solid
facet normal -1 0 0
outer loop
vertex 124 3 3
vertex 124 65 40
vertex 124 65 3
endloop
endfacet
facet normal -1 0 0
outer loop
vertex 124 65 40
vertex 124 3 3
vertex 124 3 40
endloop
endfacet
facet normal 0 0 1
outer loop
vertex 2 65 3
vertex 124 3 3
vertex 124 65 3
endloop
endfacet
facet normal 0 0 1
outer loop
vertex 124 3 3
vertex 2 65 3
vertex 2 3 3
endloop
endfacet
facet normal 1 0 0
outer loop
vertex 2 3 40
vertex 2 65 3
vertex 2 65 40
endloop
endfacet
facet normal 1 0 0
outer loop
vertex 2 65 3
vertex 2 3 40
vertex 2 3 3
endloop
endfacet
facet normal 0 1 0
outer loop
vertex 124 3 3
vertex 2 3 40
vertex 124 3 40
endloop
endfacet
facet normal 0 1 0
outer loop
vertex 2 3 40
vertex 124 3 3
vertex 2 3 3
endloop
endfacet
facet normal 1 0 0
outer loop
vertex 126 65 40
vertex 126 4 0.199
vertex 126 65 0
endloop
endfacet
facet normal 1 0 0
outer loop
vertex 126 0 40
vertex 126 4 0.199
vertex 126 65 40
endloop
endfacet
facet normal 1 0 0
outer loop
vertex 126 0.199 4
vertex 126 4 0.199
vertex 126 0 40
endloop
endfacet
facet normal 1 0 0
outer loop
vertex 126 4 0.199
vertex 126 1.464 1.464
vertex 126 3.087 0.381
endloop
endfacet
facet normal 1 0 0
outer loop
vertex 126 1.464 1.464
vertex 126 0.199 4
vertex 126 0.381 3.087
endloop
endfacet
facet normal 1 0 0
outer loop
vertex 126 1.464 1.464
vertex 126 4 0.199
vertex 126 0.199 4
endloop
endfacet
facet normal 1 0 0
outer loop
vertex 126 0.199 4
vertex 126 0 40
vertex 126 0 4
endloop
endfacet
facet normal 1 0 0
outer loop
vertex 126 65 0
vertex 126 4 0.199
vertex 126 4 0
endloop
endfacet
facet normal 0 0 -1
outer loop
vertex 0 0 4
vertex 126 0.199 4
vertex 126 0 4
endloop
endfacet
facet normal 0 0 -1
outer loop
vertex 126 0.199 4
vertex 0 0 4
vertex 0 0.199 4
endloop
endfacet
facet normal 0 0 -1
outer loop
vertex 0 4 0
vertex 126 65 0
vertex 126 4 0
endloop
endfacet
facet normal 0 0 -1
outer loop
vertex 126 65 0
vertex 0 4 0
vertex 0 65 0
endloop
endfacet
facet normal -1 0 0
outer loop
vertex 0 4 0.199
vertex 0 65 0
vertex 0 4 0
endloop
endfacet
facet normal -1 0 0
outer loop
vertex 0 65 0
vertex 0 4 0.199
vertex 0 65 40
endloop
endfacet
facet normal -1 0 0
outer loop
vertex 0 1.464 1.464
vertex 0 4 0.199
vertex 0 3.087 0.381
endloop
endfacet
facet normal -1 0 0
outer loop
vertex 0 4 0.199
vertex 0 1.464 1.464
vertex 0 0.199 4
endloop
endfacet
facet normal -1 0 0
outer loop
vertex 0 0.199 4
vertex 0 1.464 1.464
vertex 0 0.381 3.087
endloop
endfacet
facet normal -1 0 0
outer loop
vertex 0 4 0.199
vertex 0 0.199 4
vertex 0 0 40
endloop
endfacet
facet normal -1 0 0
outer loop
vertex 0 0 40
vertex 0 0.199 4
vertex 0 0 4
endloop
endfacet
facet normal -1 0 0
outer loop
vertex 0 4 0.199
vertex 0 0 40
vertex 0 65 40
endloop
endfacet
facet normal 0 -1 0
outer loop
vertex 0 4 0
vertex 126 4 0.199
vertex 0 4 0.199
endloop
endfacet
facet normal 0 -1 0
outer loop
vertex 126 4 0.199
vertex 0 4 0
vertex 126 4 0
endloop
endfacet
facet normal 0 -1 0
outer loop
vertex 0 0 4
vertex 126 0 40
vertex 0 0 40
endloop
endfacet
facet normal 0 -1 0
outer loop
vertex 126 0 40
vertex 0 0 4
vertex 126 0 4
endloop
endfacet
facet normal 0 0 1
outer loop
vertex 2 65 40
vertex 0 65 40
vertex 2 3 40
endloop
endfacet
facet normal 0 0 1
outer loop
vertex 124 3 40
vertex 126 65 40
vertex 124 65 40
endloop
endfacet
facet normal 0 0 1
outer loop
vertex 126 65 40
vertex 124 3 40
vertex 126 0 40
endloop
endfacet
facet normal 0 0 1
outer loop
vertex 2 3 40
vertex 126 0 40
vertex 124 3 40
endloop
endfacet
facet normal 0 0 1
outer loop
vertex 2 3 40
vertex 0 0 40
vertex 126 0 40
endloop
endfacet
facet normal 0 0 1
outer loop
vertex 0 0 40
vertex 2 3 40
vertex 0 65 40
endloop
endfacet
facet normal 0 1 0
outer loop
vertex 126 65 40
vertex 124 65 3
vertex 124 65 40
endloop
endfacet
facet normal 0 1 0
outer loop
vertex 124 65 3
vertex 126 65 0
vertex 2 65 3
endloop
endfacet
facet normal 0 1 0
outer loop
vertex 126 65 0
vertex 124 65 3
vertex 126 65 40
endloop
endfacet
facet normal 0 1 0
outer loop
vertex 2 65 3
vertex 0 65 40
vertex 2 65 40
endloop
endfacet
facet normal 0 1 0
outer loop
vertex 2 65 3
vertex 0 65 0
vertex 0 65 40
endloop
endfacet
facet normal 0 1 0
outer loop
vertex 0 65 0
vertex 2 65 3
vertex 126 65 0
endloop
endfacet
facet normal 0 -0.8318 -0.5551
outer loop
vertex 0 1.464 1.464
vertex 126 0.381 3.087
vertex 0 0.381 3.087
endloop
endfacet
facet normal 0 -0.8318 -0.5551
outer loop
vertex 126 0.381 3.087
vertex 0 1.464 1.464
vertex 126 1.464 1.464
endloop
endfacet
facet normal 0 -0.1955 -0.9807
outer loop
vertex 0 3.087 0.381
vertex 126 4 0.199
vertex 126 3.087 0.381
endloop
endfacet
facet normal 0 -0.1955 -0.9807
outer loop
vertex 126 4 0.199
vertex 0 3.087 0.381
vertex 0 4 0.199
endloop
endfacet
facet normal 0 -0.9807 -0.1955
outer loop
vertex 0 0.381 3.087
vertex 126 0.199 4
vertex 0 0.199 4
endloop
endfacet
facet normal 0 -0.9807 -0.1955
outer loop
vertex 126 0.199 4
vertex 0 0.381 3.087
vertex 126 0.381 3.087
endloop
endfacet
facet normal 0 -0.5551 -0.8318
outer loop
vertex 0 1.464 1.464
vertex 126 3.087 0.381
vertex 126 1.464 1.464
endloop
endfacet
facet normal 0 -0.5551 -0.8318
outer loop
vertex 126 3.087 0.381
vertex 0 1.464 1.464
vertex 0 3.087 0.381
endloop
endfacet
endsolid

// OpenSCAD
encheight = 122; // measured
hookheight = 2; // we only have 5mm between enclosures
theight = encheight + hookheight * 2;
backthick = 3;
tofan = 40; // distance from edge to 80mm fan
fanheight = 25;
tobrace = 40; // measured distance to FlexBay brace
frontwidth = fanheight + tobrace;

difference(){
  cube([theight, frontwidth, tofan]);
  union(){
    translate([hookheight, backthick, backthick]){
      cube([theight - hookheight * 2, frontwidth, tofan]);
    }
    cube([theight, 4, 4]);
  }
}

// round the corner
difference(){
  translate([0, 5, 5]){
    rotate([0, 90, 0]){
      cylinder(theight, 5, 5);
    }
  }
  translate([hookheight, backthick, backthick]){
    cube([encheight, 8, 8]);
  }
}
